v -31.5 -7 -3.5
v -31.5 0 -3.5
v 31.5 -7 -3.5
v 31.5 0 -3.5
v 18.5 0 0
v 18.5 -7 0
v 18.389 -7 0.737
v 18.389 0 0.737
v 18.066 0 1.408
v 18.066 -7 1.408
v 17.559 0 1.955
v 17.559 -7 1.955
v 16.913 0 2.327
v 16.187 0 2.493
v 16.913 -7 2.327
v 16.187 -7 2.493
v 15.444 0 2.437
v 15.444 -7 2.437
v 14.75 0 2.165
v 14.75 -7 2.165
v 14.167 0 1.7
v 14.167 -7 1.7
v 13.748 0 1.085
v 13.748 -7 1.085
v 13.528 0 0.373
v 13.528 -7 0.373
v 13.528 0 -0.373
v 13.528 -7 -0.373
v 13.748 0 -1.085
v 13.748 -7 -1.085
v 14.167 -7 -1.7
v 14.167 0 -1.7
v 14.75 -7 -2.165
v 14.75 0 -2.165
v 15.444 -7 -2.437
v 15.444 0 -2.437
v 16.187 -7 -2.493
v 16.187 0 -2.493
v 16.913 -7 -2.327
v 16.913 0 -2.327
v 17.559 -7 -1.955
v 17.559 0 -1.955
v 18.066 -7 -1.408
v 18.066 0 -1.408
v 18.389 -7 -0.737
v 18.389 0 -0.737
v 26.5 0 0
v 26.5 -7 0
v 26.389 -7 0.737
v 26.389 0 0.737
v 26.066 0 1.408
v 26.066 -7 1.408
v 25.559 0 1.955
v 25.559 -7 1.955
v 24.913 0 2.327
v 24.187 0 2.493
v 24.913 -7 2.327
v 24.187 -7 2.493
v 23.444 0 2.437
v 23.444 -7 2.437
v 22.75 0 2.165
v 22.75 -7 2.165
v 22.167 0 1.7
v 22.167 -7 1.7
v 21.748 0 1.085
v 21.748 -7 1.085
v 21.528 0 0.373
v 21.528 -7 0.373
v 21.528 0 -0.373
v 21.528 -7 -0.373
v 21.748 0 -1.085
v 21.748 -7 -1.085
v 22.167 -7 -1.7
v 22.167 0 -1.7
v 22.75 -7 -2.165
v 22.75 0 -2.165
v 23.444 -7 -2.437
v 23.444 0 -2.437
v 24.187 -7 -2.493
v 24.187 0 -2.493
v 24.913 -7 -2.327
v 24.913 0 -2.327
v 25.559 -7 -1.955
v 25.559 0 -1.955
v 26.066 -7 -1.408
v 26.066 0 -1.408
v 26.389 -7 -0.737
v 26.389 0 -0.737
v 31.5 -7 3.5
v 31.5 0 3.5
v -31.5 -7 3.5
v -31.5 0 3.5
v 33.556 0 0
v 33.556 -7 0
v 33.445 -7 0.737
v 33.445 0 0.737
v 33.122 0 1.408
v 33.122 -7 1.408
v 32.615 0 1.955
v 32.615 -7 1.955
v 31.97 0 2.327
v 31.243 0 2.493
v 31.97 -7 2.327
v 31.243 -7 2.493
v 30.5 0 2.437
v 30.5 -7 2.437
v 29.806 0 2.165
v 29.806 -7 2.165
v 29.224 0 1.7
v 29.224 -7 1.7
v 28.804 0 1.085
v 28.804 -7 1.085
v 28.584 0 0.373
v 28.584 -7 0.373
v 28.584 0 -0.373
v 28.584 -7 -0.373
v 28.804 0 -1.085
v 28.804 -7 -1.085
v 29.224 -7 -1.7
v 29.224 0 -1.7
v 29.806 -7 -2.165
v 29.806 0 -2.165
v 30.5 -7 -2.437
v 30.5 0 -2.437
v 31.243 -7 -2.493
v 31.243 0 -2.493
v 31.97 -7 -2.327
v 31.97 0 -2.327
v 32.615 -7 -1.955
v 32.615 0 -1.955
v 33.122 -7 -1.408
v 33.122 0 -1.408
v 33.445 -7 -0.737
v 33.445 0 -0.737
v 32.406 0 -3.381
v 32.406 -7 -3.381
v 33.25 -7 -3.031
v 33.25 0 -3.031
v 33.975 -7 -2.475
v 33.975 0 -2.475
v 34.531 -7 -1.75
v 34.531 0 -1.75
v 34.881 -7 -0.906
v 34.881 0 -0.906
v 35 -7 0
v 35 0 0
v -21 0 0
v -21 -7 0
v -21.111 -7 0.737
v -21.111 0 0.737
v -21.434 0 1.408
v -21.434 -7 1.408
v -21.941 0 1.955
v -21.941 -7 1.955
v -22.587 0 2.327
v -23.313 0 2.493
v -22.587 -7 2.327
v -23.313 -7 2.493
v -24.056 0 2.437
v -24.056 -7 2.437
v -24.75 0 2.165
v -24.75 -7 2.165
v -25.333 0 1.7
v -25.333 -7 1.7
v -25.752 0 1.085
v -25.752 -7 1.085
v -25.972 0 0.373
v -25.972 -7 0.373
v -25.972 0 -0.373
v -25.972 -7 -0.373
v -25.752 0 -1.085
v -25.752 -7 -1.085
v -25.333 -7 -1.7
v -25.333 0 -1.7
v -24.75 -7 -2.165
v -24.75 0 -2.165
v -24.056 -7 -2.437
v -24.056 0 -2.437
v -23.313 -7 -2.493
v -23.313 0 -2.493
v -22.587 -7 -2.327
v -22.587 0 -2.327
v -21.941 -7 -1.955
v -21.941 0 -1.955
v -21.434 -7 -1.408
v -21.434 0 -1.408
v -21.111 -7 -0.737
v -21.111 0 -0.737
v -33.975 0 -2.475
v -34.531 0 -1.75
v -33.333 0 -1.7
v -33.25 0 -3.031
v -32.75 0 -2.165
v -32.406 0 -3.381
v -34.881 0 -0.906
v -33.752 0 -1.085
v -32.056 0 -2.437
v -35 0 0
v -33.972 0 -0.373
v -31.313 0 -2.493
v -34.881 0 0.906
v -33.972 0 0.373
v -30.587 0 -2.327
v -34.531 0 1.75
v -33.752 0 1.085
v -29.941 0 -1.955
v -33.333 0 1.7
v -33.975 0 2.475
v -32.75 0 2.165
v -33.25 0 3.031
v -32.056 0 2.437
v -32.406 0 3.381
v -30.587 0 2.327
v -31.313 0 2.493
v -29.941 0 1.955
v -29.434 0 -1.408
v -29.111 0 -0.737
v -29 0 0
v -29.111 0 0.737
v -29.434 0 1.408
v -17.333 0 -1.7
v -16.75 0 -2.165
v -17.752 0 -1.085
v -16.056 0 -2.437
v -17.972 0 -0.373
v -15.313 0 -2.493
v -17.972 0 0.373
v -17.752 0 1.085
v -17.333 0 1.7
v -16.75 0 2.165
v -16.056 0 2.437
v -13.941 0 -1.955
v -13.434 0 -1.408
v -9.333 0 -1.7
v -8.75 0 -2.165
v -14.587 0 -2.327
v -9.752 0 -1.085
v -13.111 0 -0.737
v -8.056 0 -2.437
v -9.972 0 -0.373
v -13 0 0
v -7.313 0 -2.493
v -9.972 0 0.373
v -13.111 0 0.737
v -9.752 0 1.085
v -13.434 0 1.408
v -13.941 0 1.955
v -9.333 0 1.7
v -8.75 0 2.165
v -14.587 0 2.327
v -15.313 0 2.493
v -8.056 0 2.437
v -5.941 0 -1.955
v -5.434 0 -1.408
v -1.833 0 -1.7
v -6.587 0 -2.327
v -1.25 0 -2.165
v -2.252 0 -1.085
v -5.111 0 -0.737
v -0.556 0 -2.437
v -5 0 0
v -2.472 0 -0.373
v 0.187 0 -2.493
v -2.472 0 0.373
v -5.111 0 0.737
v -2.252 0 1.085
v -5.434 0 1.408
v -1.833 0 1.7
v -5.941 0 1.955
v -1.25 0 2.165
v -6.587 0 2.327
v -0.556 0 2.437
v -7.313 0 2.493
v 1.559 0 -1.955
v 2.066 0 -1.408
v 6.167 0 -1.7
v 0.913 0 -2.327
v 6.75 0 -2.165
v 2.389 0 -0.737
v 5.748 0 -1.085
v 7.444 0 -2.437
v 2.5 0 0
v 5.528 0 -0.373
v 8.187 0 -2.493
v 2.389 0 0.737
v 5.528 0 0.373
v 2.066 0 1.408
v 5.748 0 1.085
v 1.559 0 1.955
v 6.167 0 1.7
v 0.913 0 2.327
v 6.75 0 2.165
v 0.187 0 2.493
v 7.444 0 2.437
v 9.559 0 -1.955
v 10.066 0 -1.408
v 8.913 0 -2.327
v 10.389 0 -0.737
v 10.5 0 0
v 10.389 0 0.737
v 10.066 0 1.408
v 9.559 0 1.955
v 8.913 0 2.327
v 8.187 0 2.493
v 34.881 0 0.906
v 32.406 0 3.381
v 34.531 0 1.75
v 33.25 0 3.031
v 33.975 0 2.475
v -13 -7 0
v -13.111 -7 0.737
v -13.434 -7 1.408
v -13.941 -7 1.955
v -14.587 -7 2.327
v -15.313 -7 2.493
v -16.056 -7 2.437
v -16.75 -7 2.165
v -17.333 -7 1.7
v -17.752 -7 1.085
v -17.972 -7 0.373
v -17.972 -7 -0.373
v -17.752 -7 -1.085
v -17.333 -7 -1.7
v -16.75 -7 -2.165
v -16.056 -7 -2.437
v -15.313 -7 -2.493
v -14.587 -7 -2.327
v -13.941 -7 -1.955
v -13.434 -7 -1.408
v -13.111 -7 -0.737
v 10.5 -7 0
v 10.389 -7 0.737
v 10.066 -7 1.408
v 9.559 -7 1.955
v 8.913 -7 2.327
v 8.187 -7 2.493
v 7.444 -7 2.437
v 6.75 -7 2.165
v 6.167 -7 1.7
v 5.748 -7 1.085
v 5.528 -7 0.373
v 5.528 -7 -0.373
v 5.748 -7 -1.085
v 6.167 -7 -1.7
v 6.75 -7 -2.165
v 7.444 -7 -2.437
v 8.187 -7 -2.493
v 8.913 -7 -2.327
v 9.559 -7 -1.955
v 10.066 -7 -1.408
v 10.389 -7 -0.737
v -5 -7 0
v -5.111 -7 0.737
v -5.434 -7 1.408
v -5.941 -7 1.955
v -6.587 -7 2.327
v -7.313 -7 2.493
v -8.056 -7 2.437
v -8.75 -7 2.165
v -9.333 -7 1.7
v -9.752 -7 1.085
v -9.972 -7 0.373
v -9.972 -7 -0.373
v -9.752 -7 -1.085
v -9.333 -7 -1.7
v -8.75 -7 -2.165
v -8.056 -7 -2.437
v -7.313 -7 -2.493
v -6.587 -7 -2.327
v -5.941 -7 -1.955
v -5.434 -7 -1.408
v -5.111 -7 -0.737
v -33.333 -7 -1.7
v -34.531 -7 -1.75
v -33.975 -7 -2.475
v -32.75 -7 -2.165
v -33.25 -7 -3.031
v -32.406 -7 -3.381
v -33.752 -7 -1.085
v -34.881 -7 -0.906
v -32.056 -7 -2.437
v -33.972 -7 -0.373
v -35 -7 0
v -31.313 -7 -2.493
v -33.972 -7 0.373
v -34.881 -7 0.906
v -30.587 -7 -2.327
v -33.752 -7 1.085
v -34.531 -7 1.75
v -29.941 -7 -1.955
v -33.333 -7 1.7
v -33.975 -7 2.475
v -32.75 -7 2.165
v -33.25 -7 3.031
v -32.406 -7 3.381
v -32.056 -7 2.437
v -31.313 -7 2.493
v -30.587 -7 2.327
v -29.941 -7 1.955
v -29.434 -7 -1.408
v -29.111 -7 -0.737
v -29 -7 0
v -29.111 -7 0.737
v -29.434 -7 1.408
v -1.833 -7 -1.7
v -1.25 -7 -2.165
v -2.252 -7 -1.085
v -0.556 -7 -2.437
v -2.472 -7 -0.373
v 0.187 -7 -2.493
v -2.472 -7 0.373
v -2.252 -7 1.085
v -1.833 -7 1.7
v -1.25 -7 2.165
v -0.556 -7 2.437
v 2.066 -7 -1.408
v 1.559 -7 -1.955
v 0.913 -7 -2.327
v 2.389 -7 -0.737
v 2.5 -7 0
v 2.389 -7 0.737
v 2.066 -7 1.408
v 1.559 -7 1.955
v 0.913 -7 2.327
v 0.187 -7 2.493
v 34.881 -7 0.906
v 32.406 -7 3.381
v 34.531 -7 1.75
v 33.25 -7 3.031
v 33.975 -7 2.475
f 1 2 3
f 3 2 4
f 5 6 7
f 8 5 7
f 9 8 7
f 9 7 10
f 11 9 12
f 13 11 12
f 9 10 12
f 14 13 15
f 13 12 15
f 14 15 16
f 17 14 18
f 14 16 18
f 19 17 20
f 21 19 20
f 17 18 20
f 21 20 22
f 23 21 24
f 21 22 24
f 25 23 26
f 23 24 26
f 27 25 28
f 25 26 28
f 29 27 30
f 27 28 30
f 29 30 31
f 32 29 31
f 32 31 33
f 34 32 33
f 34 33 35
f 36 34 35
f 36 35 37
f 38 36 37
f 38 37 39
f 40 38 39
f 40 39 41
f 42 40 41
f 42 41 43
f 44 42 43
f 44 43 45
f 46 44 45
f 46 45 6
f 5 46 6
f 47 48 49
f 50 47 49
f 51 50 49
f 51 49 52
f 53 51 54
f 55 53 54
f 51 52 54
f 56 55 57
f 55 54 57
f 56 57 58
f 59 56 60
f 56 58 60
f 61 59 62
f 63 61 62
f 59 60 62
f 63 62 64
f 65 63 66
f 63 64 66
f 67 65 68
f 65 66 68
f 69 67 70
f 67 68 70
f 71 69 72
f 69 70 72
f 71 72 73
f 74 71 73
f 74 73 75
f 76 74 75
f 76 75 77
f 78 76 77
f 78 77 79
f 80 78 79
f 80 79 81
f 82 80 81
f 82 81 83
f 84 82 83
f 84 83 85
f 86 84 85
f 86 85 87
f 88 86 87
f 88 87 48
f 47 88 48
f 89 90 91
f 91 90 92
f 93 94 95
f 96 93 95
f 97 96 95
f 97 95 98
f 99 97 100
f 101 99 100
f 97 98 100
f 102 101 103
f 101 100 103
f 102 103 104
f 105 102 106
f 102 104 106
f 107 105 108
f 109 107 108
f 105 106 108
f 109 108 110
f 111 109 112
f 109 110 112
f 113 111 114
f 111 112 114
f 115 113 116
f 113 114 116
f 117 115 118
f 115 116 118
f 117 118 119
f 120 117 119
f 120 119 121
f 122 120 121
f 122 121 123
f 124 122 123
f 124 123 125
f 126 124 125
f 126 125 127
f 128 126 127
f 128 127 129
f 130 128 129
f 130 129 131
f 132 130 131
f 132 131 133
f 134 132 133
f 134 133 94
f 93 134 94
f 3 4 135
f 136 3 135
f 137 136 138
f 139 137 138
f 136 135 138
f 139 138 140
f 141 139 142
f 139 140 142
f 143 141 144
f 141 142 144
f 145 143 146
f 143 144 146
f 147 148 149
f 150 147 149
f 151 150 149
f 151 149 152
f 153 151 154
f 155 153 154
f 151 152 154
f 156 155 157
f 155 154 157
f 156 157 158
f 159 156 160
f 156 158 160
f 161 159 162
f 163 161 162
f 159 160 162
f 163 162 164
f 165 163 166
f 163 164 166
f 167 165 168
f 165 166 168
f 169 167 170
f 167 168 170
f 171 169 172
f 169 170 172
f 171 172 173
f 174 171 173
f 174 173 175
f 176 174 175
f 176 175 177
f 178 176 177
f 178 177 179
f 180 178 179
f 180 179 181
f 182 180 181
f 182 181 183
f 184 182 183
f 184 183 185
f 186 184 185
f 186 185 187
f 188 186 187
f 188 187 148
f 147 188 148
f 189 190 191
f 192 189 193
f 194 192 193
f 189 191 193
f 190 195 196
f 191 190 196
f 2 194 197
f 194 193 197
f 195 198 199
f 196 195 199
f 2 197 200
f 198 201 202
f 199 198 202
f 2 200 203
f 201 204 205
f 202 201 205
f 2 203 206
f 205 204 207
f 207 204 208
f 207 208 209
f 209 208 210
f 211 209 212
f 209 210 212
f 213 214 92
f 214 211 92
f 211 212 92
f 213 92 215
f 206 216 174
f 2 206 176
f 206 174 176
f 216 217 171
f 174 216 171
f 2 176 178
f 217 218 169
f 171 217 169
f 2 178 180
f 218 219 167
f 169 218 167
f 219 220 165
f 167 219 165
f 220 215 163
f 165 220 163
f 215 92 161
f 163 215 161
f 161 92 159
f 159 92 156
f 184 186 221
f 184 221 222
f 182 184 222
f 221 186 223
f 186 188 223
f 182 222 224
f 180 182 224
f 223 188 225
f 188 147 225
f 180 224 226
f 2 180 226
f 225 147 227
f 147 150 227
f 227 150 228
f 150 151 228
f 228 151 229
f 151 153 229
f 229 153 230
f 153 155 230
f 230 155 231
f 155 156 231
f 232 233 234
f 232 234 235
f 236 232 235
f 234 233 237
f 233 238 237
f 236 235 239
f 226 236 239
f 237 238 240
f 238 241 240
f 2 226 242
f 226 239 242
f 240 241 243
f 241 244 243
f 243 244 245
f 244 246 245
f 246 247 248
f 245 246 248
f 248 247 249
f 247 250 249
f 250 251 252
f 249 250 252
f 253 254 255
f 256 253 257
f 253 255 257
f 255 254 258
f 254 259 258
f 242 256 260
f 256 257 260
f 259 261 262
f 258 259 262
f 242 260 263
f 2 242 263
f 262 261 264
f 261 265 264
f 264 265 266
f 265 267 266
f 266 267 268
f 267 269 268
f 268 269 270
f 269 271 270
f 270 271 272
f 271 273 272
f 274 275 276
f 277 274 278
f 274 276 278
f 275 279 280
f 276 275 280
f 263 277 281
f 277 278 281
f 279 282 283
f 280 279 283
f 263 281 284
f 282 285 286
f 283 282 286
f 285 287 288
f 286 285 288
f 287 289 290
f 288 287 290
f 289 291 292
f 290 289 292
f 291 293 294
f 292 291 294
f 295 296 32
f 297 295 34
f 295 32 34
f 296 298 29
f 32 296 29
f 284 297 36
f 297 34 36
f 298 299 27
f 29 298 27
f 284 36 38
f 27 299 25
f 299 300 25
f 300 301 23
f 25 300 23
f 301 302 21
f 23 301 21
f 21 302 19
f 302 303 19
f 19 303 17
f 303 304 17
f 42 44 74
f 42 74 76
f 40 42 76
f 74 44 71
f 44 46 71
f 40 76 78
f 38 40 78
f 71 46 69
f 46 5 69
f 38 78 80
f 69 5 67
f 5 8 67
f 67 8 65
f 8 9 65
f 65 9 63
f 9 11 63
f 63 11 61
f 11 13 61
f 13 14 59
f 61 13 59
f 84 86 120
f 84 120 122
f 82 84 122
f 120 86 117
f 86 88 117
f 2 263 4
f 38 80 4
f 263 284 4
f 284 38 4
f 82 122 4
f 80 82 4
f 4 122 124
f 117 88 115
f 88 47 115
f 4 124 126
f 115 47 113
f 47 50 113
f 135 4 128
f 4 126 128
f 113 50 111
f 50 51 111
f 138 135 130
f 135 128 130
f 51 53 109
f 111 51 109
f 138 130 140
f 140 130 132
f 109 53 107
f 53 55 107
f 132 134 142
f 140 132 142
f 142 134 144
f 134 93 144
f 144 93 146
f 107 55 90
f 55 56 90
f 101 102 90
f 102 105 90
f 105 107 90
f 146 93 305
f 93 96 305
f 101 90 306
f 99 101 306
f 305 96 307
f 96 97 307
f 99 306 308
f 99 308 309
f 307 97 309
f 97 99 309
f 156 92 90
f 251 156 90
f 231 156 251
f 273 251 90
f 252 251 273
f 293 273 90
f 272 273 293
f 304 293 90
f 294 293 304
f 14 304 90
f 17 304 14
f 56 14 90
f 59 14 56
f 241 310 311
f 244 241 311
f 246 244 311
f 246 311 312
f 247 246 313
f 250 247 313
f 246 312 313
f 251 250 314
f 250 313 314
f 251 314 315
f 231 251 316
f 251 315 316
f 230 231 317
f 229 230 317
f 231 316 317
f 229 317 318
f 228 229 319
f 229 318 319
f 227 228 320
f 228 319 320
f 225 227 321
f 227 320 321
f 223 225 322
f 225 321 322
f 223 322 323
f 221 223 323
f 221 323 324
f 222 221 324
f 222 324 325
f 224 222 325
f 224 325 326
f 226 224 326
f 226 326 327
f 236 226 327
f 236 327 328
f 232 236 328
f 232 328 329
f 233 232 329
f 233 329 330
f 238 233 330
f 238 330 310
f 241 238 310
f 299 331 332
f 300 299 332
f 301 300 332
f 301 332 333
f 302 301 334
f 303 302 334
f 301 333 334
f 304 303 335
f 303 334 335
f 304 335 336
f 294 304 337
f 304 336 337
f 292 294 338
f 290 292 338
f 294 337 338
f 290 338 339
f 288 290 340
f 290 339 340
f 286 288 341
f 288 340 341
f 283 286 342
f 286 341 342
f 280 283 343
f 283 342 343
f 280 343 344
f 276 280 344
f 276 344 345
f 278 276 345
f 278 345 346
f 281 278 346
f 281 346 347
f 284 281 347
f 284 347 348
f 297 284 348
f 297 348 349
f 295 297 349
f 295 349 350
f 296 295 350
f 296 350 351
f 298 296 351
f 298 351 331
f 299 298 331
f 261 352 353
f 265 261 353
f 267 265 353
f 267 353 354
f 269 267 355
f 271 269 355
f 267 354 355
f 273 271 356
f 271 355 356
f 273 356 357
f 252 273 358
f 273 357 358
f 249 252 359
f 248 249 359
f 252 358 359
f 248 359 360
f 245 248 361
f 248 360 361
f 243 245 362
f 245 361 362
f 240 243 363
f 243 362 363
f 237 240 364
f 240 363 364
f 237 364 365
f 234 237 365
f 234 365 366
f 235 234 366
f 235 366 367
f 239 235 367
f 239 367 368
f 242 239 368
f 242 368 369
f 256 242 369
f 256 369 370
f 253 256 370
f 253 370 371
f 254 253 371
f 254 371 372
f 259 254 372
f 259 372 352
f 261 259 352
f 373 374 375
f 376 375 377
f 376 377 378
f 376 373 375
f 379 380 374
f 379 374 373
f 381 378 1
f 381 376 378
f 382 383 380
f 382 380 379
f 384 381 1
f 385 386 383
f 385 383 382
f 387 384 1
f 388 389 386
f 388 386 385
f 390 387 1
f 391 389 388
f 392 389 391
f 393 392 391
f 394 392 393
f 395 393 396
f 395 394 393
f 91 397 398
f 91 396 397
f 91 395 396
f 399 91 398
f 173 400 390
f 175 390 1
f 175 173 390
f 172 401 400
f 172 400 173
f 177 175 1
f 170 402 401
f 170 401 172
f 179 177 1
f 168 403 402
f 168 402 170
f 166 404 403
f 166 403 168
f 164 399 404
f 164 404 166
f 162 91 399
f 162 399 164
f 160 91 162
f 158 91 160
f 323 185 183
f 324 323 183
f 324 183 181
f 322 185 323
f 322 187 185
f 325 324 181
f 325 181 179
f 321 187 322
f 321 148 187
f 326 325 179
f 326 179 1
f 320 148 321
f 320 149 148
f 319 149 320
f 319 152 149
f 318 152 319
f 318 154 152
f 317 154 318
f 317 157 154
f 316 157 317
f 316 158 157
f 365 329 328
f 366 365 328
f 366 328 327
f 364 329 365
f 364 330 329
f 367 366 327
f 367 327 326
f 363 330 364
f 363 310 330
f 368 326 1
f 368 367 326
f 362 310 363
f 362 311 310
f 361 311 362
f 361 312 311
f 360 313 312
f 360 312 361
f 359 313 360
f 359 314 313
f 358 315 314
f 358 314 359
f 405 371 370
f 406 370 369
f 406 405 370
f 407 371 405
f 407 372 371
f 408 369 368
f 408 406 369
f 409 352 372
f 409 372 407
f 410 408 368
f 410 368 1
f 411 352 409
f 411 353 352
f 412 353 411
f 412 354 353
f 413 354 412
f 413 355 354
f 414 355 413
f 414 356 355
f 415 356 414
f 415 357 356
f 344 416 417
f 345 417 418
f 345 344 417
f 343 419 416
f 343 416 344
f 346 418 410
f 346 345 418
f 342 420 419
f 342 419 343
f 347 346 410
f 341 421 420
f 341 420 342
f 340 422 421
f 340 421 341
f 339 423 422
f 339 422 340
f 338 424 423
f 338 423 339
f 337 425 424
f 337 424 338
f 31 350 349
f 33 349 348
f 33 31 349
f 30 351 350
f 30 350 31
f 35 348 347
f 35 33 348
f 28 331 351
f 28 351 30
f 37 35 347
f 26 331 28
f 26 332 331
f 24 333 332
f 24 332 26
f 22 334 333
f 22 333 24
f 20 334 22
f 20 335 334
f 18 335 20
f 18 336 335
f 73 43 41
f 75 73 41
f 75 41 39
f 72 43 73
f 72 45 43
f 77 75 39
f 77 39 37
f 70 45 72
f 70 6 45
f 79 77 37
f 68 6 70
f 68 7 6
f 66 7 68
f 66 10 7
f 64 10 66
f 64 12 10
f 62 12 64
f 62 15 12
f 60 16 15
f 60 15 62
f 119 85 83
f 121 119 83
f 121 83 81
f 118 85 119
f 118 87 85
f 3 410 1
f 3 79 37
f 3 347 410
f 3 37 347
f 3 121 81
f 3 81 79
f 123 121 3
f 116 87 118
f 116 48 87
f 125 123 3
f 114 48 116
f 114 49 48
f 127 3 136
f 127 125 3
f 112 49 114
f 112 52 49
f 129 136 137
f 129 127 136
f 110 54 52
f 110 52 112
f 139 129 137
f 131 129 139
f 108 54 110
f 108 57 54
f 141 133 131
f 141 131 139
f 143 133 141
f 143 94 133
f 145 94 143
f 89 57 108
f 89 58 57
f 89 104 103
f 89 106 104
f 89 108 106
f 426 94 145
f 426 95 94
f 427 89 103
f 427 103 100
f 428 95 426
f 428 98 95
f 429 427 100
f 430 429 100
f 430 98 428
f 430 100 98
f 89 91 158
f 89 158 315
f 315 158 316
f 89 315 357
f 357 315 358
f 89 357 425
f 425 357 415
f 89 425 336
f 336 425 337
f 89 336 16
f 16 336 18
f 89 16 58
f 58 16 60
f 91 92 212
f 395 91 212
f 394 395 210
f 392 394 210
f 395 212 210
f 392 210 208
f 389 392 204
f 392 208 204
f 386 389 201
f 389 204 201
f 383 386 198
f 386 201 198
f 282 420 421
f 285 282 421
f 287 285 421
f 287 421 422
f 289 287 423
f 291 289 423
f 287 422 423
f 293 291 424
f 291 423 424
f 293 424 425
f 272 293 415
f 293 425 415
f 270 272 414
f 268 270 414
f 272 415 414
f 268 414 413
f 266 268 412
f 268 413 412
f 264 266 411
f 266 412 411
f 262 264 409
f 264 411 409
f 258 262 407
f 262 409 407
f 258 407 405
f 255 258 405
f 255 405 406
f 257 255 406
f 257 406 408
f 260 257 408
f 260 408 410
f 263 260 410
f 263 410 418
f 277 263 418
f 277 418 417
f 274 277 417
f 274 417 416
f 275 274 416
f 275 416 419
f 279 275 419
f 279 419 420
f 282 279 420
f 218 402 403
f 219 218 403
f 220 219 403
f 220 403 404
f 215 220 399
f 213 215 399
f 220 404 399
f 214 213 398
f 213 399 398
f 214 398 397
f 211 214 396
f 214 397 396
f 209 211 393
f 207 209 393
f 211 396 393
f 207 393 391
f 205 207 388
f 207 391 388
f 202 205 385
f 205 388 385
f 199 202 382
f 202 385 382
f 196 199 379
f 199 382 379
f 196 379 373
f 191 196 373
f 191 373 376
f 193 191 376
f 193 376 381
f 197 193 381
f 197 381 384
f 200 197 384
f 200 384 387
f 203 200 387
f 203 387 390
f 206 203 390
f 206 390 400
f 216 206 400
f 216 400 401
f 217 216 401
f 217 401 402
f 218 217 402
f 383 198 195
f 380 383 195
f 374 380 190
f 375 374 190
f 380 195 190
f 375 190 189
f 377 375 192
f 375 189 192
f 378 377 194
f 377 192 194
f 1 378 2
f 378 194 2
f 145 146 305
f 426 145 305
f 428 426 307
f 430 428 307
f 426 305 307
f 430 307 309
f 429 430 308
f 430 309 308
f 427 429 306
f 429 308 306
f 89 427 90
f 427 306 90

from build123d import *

# Parameters (mm, degrees)
F1_DEPTH = 7
F4_DEPTH = 7.001


with BuildPart() as f1:
    # F0 (on Front) → F1 (new body)
    with BuildSketch(Plane.XZ):
        with BuildLine():
            Line((-31.5, -3.5), (31.5, -3.5))
            ThreePointArc((31.5, -3.5), (33.974874, -2.474874), (35, 0))
            ThreePointArc((35, 0), (33.974874, 2.474874), (31.5, 3.5))
            Line((31.5, 3.5), (-31.5, 3.5))
            ThreePointArc((-31.5, 3.5), (-33.974874, 2.474874), (-35, 0))
            ThreePointArc((-35, 0), (-33.974874, -2.474874), (-31.5, -3.5))
        make_face()
    extrude(amount=F1_DEPTH)

    # F3 (on face) → F4 (cut, through all)
    with BuildSketch(Plane.XZ.offset(7)):
        with BuildLine():
            ThreePointArc((28.556413, 0), (31.056413, -2.5), (33.556413, 0))
            Line((33.556413, 0), (28.556413, 0))
        make_face()
        with BuildLine():
            Line((28.556413, 0), (33.556413, 0))
            ThreePointArc((33.556413, 0), (31.056413, 2.5), (28.556413, 0))
        make_face()
        with BuildLine():
            ThreePointArc((-34, 0), (-31.5, -2.5), (-29, 0))
            Line((-29, 0), (-34, 0))
        make_face()
        with BuildLine():
            Line((-34, 0), (-29, 0))
            ThreePointArc((-29, 0), (-31.5, 2.5), (-34, 0))
        make_face()
        with BuildLine():
            ThreePointArc((-26, 0), (-23.5, -2.5), (-21, 0))
            Line((-21, 0), (-26, 0))
        make_face()
        with BuildLine():
            Line((-26, 0), (-21, 0))
            ThreePointArc((-21, 0), (-23.5, 2.5), (-26, 0))
        make_face()
        with BuildLine():
            ThreePointArc((-18, 0), (-15.5, -2.5), (-13, 0))
            Line((-13, 0), (-18, 0))
        make_face()
        with BuildLine():
            Line((-18, 0), (-13, 0))
            ThreePointArc((-13, 0), (-15.5, 2.5), (-18, 0))
        make_face()
        with BuildLine():
            ThreePointArc((-10, 0), (-7.5, -2.5), (-5, 0))
            Line((-5, 0), (-10, 0))
        make_face()
        with BuildLine():
            Line((-10, 0), (-5, 0))
            ThreePointArc((-5, 0), (-7.5, 2.5), (-10, 0))
        make_face()
        with BuildLine():
            ThreePointArc((-2.5, 0), (0, -2.5), (2.5, 0))
            Line((2.5, 0), (-2.5, 0))
        make_face()
        with BuildLine():
            Line((-2.5, 0), (2.5, 0))
            ThreePointArc((2.5, 0), (0, 2.5), (-2.5, 0))
        make_face()
        with BuildLine():
            ThreePointArc((5.5, 0), (8, -2.5), (10.5, 0))
            Line((10.5, 0), (5.5, 0))
        make_face()
        with BuildLine():
            Line((5.5, 0), (10.5, 0))
            ThreePointArc((10.5, 0), (8, 2.5), (5.5, 0))
        make_face()
        with BuildLine():
            ThreePointArc((13.5, 0), (16, -2.5), (18.5, 0))
            Line((18.5, 0), (13.5, 0))
        make_face()
        with BuildLine():
            Line((13.5, 0), (18.5, 0))
            ThreePointArc((18.5, 0), (16, 2.5), (13.5, 0))
        make_face()
        with BuildLine():
            ThreePointArc((21.5, 0), (24, -2.5), (26.5, 0))
            Line((26.5, 0), (21.5, 0))
        make_face()
        with BuildLine():
            Line((21.5, 0), (26.5, 0))
            ThreePointArc((26.5, 0), (24, 2.5), (21.5, 0))
        make_face()
    extrude(amount=-F4_DEPTH, mode=Mode.SUBTRACT)


solid = f1.part
